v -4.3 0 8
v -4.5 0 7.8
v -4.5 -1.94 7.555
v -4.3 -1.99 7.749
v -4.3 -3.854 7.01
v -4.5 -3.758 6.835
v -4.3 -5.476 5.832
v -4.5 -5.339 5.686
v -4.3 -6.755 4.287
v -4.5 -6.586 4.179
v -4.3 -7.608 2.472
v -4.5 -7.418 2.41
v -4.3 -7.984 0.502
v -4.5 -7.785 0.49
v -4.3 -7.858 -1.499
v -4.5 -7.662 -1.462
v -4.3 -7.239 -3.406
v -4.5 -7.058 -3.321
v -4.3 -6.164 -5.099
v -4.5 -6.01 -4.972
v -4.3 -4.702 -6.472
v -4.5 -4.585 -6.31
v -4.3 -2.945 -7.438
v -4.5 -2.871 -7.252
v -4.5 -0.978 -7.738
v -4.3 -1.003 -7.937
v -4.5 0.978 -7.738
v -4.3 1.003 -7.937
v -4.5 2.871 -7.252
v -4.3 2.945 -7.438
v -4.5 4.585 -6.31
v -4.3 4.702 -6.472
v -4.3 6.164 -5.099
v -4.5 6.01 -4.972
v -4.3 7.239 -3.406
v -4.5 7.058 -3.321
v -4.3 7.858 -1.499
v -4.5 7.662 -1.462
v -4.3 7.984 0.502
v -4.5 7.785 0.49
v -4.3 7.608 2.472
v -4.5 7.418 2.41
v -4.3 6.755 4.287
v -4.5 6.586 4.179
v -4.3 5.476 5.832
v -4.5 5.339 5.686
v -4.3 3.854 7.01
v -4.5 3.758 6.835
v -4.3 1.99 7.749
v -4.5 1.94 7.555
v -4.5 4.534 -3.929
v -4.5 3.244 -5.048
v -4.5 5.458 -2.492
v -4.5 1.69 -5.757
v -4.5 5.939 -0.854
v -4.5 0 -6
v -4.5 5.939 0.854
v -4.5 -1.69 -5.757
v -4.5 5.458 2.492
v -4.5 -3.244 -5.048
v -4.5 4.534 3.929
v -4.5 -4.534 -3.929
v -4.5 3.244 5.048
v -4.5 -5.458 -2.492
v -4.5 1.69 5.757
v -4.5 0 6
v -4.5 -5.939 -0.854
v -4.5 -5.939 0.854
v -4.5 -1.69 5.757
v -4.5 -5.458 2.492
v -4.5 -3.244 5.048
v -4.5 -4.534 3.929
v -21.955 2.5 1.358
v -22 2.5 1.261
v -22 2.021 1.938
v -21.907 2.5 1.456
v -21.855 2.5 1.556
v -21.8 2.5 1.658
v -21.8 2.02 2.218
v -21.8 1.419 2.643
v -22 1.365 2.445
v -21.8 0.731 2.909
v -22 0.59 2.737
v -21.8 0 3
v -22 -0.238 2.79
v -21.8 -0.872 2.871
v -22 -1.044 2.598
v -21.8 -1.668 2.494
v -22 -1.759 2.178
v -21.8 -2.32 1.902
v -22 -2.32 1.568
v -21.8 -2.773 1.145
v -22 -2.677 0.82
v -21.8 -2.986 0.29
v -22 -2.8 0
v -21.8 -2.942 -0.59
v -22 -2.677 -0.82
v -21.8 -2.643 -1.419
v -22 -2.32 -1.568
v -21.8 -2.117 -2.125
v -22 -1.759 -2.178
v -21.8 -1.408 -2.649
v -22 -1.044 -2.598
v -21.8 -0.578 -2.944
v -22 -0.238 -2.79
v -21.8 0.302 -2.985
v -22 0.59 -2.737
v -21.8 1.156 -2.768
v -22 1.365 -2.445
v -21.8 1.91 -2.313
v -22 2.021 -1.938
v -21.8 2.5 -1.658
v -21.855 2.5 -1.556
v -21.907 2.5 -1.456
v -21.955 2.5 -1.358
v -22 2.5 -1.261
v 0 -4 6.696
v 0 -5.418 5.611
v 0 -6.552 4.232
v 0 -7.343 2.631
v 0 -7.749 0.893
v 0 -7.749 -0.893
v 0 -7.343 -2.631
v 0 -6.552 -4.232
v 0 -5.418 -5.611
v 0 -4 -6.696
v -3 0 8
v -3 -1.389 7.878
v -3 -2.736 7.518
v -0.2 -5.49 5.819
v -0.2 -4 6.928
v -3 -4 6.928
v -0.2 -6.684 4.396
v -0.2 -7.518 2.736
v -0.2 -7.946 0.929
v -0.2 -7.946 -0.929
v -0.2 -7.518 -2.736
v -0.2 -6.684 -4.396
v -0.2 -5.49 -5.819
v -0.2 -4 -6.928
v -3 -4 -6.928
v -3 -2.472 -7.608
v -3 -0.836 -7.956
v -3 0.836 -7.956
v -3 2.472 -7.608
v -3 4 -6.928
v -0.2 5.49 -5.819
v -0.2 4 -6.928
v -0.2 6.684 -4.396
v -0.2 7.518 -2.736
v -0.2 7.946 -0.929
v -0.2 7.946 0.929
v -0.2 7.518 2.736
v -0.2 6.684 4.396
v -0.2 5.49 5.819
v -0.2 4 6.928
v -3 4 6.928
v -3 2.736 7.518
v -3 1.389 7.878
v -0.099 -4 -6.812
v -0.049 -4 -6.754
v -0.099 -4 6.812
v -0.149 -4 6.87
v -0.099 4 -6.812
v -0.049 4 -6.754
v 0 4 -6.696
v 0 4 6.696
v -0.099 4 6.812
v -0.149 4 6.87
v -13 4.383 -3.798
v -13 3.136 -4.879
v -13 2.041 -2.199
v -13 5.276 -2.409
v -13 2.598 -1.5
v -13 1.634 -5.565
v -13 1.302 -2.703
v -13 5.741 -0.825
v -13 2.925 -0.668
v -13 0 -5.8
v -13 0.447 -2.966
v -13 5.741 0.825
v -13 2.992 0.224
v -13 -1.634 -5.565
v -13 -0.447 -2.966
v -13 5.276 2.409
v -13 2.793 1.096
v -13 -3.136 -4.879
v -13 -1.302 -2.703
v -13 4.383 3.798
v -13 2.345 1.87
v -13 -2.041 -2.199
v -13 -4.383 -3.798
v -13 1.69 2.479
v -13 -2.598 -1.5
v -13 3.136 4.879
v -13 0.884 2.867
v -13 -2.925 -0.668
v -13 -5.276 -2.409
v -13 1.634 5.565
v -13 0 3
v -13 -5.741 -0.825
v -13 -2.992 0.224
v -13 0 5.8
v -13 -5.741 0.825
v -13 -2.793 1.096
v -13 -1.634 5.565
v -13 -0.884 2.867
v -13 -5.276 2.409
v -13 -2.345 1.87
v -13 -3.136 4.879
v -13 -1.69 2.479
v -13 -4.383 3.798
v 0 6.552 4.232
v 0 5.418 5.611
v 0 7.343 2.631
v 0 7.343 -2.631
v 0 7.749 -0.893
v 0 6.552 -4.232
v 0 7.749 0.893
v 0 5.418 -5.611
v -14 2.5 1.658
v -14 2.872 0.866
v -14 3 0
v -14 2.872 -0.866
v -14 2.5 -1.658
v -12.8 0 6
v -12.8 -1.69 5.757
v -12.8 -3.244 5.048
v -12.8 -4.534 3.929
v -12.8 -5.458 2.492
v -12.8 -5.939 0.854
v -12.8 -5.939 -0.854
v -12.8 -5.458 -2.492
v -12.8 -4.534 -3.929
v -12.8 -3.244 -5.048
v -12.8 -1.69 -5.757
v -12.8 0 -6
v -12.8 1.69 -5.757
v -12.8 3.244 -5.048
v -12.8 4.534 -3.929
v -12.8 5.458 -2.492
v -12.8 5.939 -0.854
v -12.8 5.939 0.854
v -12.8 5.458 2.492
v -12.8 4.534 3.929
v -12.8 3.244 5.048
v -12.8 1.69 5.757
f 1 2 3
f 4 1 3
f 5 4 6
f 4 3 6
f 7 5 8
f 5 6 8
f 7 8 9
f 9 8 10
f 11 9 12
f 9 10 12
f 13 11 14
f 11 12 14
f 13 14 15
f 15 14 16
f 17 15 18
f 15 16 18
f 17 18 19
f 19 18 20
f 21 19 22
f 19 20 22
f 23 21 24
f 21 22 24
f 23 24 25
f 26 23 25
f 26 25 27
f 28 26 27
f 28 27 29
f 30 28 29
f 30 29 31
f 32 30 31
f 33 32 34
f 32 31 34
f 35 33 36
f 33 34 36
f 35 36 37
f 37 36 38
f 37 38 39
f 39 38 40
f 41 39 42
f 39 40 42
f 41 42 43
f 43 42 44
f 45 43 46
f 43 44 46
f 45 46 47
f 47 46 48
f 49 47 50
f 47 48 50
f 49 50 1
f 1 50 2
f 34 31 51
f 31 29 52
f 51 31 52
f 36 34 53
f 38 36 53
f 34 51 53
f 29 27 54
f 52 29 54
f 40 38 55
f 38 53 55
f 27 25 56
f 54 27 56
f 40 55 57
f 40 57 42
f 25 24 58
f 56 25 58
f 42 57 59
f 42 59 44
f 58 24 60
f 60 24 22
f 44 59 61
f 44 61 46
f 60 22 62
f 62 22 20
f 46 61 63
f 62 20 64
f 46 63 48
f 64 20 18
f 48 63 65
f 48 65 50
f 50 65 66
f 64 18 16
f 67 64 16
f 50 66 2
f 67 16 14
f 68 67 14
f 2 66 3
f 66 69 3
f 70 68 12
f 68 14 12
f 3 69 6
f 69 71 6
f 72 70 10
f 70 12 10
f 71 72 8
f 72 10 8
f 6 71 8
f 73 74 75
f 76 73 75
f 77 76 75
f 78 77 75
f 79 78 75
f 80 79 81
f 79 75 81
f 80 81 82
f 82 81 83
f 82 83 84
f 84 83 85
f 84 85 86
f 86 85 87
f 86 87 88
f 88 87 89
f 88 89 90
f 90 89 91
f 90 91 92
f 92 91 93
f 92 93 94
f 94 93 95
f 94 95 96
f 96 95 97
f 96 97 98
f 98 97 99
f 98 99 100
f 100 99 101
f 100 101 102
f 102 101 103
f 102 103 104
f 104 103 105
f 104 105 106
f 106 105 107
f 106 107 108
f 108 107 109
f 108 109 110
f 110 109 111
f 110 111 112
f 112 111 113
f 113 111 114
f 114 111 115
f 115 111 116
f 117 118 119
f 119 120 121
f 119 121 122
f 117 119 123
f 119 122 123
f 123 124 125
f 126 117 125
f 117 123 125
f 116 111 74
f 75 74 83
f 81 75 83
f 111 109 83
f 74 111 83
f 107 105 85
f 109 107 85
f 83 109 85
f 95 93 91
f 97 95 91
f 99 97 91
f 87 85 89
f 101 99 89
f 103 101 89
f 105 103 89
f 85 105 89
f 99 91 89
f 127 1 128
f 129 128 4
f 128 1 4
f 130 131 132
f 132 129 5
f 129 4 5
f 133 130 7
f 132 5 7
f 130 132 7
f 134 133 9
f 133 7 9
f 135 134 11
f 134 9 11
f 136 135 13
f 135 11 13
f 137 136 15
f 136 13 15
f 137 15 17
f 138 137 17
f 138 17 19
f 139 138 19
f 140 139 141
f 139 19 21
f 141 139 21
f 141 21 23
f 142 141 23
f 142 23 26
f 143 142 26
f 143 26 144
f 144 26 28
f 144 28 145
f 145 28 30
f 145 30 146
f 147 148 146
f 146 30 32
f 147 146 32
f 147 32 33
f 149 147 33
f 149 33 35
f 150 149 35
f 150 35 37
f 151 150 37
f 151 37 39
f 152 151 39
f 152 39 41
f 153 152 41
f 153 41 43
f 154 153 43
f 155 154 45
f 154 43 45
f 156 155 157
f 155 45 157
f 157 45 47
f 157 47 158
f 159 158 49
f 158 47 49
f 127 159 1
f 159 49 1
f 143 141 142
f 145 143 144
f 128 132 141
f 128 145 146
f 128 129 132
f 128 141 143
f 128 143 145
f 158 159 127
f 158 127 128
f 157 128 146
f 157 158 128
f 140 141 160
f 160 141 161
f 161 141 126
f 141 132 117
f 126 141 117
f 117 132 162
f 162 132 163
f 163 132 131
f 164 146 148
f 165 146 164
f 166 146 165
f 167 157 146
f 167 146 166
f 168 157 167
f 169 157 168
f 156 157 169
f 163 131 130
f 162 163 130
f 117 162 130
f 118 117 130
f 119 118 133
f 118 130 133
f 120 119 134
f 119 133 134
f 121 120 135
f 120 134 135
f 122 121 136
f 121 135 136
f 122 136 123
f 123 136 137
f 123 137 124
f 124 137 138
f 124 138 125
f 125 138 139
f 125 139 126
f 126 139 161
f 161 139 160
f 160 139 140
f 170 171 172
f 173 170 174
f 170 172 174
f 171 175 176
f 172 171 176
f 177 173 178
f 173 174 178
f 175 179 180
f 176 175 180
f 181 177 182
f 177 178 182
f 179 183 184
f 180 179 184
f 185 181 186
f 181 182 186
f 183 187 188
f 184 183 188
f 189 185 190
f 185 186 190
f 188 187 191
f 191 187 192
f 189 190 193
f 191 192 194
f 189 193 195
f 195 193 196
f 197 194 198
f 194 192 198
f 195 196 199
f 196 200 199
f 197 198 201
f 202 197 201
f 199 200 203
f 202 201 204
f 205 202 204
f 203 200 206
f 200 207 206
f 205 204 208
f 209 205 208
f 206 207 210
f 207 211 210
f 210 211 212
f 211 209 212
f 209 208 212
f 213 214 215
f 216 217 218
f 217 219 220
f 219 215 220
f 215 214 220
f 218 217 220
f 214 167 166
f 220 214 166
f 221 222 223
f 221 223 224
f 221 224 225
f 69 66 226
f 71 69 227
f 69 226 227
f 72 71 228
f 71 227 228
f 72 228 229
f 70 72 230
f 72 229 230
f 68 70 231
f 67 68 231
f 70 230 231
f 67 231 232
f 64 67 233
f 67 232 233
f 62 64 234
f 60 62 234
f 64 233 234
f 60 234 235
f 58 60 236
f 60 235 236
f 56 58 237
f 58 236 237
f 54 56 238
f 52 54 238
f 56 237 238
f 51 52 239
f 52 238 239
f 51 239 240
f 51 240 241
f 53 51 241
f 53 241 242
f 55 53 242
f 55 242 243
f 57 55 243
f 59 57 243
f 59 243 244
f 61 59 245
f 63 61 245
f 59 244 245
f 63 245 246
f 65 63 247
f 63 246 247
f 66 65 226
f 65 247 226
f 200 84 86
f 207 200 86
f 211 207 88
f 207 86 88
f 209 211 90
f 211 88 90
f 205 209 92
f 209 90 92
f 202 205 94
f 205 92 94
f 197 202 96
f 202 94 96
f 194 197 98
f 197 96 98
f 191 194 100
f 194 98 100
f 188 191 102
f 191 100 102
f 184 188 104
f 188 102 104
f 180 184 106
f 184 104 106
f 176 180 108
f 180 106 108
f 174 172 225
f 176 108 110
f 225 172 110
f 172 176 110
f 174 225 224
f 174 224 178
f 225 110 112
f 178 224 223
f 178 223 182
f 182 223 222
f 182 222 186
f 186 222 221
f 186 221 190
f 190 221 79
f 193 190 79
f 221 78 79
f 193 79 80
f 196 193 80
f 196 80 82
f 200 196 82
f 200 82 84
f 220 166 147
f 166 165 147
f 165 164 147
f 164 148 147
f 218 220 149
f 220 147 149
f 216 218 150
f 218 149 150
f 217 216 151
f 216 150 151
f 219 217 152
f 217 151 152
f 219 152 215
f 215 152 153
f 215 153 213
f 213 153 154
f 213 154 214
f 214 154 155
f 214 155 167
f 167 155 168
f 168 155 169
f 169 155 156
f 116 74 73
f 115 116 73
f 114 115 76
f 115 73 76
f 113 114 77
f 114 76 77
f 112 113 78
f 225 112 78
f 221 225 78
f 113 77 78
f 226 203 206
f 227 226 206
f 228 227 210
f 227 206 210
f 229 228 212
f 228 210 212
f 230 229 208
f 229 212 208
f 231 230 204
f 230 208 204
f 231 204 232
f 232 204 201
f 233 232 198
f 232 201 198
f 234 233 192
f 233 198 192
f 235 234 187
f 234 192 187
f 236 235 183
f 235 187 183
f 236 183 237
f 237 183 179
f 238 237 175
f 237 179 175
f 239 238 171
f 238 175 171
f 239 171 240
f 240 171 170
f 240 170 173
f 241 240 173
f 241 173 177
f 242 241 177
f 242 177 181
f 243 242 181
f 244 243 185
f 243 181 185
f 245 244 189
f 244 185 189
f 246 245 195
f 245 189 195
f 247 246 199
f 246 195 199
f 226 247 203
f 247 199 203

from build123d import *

# Parameters (mm, degrees)
CHANFREIN1_SIZE         = 0.2
ESQUISSE3_W             = 8
ESQUISSE3_H             = 2
ENL_V_MAT_EXTRU_2_DEPTH = 8
ESQUISSE4_W             = 3
ESQUISSE4_H             = 8
ENL_V_MAT_EXTRU_3_DEPTH = 10


with BuildPart() as part:
    # Esquisse1 → Révolution1 (revolve)
    with BuildSketch(Plane.XY, mode=Mode.PRIVATE) as r_volution1_sk:
        Polygon((-4.5, 6), (-13, 6), (-13, 3), (-22, 3), (-22, 0), (0, 0), (0, 8), (-4.5, 8), align=None)
    revolve(r_volution1_sk.sketch.rotate(Axis((0, 0, 0), (1, 0, 0)), 90), axis=Axis((0, 0, 0), (1, 0, 0)))

    # Chanfrein1
    chanfrein1_edges = [part.edges().sort_by_distance(p)[0] for p in [
        (0, 0, -8),
        (-4.5, 0, -8),
        (-13, 0, -6),
        (-22, 0, -3),
    ]]
    chamfer(chanfrein1_edges, length=CHANFREIN1_SIZE)

    # Esquisse3 → Enlèv. mat.-Extru.2 (cut)
    with BuildSketch(Plane.ZY.offset(22)):
        with Locations((0, 3.5)):
            Rectangle(ESQUISSE3_W, ESQUISSE3_H)
    extrude(amount=-ENL_V_MAT_EXTRU_2_DEPTH, mode=Mode.SUBTRACT)

    # Esquisse4 → Enlèv. mat.-Extru.3 (cut, symmetric)
    with BuildSketch(Plane.XY):
        with Locations((-1.5, 0)):
            Rectangle(ESQUISSE4_W, ESQUISSE4_H)
    extrude(amount=ENL_V_MAT_EXTRU_3_DEPTH, both=True, mode=Mode.SUBTRACT)


solid = part.part
